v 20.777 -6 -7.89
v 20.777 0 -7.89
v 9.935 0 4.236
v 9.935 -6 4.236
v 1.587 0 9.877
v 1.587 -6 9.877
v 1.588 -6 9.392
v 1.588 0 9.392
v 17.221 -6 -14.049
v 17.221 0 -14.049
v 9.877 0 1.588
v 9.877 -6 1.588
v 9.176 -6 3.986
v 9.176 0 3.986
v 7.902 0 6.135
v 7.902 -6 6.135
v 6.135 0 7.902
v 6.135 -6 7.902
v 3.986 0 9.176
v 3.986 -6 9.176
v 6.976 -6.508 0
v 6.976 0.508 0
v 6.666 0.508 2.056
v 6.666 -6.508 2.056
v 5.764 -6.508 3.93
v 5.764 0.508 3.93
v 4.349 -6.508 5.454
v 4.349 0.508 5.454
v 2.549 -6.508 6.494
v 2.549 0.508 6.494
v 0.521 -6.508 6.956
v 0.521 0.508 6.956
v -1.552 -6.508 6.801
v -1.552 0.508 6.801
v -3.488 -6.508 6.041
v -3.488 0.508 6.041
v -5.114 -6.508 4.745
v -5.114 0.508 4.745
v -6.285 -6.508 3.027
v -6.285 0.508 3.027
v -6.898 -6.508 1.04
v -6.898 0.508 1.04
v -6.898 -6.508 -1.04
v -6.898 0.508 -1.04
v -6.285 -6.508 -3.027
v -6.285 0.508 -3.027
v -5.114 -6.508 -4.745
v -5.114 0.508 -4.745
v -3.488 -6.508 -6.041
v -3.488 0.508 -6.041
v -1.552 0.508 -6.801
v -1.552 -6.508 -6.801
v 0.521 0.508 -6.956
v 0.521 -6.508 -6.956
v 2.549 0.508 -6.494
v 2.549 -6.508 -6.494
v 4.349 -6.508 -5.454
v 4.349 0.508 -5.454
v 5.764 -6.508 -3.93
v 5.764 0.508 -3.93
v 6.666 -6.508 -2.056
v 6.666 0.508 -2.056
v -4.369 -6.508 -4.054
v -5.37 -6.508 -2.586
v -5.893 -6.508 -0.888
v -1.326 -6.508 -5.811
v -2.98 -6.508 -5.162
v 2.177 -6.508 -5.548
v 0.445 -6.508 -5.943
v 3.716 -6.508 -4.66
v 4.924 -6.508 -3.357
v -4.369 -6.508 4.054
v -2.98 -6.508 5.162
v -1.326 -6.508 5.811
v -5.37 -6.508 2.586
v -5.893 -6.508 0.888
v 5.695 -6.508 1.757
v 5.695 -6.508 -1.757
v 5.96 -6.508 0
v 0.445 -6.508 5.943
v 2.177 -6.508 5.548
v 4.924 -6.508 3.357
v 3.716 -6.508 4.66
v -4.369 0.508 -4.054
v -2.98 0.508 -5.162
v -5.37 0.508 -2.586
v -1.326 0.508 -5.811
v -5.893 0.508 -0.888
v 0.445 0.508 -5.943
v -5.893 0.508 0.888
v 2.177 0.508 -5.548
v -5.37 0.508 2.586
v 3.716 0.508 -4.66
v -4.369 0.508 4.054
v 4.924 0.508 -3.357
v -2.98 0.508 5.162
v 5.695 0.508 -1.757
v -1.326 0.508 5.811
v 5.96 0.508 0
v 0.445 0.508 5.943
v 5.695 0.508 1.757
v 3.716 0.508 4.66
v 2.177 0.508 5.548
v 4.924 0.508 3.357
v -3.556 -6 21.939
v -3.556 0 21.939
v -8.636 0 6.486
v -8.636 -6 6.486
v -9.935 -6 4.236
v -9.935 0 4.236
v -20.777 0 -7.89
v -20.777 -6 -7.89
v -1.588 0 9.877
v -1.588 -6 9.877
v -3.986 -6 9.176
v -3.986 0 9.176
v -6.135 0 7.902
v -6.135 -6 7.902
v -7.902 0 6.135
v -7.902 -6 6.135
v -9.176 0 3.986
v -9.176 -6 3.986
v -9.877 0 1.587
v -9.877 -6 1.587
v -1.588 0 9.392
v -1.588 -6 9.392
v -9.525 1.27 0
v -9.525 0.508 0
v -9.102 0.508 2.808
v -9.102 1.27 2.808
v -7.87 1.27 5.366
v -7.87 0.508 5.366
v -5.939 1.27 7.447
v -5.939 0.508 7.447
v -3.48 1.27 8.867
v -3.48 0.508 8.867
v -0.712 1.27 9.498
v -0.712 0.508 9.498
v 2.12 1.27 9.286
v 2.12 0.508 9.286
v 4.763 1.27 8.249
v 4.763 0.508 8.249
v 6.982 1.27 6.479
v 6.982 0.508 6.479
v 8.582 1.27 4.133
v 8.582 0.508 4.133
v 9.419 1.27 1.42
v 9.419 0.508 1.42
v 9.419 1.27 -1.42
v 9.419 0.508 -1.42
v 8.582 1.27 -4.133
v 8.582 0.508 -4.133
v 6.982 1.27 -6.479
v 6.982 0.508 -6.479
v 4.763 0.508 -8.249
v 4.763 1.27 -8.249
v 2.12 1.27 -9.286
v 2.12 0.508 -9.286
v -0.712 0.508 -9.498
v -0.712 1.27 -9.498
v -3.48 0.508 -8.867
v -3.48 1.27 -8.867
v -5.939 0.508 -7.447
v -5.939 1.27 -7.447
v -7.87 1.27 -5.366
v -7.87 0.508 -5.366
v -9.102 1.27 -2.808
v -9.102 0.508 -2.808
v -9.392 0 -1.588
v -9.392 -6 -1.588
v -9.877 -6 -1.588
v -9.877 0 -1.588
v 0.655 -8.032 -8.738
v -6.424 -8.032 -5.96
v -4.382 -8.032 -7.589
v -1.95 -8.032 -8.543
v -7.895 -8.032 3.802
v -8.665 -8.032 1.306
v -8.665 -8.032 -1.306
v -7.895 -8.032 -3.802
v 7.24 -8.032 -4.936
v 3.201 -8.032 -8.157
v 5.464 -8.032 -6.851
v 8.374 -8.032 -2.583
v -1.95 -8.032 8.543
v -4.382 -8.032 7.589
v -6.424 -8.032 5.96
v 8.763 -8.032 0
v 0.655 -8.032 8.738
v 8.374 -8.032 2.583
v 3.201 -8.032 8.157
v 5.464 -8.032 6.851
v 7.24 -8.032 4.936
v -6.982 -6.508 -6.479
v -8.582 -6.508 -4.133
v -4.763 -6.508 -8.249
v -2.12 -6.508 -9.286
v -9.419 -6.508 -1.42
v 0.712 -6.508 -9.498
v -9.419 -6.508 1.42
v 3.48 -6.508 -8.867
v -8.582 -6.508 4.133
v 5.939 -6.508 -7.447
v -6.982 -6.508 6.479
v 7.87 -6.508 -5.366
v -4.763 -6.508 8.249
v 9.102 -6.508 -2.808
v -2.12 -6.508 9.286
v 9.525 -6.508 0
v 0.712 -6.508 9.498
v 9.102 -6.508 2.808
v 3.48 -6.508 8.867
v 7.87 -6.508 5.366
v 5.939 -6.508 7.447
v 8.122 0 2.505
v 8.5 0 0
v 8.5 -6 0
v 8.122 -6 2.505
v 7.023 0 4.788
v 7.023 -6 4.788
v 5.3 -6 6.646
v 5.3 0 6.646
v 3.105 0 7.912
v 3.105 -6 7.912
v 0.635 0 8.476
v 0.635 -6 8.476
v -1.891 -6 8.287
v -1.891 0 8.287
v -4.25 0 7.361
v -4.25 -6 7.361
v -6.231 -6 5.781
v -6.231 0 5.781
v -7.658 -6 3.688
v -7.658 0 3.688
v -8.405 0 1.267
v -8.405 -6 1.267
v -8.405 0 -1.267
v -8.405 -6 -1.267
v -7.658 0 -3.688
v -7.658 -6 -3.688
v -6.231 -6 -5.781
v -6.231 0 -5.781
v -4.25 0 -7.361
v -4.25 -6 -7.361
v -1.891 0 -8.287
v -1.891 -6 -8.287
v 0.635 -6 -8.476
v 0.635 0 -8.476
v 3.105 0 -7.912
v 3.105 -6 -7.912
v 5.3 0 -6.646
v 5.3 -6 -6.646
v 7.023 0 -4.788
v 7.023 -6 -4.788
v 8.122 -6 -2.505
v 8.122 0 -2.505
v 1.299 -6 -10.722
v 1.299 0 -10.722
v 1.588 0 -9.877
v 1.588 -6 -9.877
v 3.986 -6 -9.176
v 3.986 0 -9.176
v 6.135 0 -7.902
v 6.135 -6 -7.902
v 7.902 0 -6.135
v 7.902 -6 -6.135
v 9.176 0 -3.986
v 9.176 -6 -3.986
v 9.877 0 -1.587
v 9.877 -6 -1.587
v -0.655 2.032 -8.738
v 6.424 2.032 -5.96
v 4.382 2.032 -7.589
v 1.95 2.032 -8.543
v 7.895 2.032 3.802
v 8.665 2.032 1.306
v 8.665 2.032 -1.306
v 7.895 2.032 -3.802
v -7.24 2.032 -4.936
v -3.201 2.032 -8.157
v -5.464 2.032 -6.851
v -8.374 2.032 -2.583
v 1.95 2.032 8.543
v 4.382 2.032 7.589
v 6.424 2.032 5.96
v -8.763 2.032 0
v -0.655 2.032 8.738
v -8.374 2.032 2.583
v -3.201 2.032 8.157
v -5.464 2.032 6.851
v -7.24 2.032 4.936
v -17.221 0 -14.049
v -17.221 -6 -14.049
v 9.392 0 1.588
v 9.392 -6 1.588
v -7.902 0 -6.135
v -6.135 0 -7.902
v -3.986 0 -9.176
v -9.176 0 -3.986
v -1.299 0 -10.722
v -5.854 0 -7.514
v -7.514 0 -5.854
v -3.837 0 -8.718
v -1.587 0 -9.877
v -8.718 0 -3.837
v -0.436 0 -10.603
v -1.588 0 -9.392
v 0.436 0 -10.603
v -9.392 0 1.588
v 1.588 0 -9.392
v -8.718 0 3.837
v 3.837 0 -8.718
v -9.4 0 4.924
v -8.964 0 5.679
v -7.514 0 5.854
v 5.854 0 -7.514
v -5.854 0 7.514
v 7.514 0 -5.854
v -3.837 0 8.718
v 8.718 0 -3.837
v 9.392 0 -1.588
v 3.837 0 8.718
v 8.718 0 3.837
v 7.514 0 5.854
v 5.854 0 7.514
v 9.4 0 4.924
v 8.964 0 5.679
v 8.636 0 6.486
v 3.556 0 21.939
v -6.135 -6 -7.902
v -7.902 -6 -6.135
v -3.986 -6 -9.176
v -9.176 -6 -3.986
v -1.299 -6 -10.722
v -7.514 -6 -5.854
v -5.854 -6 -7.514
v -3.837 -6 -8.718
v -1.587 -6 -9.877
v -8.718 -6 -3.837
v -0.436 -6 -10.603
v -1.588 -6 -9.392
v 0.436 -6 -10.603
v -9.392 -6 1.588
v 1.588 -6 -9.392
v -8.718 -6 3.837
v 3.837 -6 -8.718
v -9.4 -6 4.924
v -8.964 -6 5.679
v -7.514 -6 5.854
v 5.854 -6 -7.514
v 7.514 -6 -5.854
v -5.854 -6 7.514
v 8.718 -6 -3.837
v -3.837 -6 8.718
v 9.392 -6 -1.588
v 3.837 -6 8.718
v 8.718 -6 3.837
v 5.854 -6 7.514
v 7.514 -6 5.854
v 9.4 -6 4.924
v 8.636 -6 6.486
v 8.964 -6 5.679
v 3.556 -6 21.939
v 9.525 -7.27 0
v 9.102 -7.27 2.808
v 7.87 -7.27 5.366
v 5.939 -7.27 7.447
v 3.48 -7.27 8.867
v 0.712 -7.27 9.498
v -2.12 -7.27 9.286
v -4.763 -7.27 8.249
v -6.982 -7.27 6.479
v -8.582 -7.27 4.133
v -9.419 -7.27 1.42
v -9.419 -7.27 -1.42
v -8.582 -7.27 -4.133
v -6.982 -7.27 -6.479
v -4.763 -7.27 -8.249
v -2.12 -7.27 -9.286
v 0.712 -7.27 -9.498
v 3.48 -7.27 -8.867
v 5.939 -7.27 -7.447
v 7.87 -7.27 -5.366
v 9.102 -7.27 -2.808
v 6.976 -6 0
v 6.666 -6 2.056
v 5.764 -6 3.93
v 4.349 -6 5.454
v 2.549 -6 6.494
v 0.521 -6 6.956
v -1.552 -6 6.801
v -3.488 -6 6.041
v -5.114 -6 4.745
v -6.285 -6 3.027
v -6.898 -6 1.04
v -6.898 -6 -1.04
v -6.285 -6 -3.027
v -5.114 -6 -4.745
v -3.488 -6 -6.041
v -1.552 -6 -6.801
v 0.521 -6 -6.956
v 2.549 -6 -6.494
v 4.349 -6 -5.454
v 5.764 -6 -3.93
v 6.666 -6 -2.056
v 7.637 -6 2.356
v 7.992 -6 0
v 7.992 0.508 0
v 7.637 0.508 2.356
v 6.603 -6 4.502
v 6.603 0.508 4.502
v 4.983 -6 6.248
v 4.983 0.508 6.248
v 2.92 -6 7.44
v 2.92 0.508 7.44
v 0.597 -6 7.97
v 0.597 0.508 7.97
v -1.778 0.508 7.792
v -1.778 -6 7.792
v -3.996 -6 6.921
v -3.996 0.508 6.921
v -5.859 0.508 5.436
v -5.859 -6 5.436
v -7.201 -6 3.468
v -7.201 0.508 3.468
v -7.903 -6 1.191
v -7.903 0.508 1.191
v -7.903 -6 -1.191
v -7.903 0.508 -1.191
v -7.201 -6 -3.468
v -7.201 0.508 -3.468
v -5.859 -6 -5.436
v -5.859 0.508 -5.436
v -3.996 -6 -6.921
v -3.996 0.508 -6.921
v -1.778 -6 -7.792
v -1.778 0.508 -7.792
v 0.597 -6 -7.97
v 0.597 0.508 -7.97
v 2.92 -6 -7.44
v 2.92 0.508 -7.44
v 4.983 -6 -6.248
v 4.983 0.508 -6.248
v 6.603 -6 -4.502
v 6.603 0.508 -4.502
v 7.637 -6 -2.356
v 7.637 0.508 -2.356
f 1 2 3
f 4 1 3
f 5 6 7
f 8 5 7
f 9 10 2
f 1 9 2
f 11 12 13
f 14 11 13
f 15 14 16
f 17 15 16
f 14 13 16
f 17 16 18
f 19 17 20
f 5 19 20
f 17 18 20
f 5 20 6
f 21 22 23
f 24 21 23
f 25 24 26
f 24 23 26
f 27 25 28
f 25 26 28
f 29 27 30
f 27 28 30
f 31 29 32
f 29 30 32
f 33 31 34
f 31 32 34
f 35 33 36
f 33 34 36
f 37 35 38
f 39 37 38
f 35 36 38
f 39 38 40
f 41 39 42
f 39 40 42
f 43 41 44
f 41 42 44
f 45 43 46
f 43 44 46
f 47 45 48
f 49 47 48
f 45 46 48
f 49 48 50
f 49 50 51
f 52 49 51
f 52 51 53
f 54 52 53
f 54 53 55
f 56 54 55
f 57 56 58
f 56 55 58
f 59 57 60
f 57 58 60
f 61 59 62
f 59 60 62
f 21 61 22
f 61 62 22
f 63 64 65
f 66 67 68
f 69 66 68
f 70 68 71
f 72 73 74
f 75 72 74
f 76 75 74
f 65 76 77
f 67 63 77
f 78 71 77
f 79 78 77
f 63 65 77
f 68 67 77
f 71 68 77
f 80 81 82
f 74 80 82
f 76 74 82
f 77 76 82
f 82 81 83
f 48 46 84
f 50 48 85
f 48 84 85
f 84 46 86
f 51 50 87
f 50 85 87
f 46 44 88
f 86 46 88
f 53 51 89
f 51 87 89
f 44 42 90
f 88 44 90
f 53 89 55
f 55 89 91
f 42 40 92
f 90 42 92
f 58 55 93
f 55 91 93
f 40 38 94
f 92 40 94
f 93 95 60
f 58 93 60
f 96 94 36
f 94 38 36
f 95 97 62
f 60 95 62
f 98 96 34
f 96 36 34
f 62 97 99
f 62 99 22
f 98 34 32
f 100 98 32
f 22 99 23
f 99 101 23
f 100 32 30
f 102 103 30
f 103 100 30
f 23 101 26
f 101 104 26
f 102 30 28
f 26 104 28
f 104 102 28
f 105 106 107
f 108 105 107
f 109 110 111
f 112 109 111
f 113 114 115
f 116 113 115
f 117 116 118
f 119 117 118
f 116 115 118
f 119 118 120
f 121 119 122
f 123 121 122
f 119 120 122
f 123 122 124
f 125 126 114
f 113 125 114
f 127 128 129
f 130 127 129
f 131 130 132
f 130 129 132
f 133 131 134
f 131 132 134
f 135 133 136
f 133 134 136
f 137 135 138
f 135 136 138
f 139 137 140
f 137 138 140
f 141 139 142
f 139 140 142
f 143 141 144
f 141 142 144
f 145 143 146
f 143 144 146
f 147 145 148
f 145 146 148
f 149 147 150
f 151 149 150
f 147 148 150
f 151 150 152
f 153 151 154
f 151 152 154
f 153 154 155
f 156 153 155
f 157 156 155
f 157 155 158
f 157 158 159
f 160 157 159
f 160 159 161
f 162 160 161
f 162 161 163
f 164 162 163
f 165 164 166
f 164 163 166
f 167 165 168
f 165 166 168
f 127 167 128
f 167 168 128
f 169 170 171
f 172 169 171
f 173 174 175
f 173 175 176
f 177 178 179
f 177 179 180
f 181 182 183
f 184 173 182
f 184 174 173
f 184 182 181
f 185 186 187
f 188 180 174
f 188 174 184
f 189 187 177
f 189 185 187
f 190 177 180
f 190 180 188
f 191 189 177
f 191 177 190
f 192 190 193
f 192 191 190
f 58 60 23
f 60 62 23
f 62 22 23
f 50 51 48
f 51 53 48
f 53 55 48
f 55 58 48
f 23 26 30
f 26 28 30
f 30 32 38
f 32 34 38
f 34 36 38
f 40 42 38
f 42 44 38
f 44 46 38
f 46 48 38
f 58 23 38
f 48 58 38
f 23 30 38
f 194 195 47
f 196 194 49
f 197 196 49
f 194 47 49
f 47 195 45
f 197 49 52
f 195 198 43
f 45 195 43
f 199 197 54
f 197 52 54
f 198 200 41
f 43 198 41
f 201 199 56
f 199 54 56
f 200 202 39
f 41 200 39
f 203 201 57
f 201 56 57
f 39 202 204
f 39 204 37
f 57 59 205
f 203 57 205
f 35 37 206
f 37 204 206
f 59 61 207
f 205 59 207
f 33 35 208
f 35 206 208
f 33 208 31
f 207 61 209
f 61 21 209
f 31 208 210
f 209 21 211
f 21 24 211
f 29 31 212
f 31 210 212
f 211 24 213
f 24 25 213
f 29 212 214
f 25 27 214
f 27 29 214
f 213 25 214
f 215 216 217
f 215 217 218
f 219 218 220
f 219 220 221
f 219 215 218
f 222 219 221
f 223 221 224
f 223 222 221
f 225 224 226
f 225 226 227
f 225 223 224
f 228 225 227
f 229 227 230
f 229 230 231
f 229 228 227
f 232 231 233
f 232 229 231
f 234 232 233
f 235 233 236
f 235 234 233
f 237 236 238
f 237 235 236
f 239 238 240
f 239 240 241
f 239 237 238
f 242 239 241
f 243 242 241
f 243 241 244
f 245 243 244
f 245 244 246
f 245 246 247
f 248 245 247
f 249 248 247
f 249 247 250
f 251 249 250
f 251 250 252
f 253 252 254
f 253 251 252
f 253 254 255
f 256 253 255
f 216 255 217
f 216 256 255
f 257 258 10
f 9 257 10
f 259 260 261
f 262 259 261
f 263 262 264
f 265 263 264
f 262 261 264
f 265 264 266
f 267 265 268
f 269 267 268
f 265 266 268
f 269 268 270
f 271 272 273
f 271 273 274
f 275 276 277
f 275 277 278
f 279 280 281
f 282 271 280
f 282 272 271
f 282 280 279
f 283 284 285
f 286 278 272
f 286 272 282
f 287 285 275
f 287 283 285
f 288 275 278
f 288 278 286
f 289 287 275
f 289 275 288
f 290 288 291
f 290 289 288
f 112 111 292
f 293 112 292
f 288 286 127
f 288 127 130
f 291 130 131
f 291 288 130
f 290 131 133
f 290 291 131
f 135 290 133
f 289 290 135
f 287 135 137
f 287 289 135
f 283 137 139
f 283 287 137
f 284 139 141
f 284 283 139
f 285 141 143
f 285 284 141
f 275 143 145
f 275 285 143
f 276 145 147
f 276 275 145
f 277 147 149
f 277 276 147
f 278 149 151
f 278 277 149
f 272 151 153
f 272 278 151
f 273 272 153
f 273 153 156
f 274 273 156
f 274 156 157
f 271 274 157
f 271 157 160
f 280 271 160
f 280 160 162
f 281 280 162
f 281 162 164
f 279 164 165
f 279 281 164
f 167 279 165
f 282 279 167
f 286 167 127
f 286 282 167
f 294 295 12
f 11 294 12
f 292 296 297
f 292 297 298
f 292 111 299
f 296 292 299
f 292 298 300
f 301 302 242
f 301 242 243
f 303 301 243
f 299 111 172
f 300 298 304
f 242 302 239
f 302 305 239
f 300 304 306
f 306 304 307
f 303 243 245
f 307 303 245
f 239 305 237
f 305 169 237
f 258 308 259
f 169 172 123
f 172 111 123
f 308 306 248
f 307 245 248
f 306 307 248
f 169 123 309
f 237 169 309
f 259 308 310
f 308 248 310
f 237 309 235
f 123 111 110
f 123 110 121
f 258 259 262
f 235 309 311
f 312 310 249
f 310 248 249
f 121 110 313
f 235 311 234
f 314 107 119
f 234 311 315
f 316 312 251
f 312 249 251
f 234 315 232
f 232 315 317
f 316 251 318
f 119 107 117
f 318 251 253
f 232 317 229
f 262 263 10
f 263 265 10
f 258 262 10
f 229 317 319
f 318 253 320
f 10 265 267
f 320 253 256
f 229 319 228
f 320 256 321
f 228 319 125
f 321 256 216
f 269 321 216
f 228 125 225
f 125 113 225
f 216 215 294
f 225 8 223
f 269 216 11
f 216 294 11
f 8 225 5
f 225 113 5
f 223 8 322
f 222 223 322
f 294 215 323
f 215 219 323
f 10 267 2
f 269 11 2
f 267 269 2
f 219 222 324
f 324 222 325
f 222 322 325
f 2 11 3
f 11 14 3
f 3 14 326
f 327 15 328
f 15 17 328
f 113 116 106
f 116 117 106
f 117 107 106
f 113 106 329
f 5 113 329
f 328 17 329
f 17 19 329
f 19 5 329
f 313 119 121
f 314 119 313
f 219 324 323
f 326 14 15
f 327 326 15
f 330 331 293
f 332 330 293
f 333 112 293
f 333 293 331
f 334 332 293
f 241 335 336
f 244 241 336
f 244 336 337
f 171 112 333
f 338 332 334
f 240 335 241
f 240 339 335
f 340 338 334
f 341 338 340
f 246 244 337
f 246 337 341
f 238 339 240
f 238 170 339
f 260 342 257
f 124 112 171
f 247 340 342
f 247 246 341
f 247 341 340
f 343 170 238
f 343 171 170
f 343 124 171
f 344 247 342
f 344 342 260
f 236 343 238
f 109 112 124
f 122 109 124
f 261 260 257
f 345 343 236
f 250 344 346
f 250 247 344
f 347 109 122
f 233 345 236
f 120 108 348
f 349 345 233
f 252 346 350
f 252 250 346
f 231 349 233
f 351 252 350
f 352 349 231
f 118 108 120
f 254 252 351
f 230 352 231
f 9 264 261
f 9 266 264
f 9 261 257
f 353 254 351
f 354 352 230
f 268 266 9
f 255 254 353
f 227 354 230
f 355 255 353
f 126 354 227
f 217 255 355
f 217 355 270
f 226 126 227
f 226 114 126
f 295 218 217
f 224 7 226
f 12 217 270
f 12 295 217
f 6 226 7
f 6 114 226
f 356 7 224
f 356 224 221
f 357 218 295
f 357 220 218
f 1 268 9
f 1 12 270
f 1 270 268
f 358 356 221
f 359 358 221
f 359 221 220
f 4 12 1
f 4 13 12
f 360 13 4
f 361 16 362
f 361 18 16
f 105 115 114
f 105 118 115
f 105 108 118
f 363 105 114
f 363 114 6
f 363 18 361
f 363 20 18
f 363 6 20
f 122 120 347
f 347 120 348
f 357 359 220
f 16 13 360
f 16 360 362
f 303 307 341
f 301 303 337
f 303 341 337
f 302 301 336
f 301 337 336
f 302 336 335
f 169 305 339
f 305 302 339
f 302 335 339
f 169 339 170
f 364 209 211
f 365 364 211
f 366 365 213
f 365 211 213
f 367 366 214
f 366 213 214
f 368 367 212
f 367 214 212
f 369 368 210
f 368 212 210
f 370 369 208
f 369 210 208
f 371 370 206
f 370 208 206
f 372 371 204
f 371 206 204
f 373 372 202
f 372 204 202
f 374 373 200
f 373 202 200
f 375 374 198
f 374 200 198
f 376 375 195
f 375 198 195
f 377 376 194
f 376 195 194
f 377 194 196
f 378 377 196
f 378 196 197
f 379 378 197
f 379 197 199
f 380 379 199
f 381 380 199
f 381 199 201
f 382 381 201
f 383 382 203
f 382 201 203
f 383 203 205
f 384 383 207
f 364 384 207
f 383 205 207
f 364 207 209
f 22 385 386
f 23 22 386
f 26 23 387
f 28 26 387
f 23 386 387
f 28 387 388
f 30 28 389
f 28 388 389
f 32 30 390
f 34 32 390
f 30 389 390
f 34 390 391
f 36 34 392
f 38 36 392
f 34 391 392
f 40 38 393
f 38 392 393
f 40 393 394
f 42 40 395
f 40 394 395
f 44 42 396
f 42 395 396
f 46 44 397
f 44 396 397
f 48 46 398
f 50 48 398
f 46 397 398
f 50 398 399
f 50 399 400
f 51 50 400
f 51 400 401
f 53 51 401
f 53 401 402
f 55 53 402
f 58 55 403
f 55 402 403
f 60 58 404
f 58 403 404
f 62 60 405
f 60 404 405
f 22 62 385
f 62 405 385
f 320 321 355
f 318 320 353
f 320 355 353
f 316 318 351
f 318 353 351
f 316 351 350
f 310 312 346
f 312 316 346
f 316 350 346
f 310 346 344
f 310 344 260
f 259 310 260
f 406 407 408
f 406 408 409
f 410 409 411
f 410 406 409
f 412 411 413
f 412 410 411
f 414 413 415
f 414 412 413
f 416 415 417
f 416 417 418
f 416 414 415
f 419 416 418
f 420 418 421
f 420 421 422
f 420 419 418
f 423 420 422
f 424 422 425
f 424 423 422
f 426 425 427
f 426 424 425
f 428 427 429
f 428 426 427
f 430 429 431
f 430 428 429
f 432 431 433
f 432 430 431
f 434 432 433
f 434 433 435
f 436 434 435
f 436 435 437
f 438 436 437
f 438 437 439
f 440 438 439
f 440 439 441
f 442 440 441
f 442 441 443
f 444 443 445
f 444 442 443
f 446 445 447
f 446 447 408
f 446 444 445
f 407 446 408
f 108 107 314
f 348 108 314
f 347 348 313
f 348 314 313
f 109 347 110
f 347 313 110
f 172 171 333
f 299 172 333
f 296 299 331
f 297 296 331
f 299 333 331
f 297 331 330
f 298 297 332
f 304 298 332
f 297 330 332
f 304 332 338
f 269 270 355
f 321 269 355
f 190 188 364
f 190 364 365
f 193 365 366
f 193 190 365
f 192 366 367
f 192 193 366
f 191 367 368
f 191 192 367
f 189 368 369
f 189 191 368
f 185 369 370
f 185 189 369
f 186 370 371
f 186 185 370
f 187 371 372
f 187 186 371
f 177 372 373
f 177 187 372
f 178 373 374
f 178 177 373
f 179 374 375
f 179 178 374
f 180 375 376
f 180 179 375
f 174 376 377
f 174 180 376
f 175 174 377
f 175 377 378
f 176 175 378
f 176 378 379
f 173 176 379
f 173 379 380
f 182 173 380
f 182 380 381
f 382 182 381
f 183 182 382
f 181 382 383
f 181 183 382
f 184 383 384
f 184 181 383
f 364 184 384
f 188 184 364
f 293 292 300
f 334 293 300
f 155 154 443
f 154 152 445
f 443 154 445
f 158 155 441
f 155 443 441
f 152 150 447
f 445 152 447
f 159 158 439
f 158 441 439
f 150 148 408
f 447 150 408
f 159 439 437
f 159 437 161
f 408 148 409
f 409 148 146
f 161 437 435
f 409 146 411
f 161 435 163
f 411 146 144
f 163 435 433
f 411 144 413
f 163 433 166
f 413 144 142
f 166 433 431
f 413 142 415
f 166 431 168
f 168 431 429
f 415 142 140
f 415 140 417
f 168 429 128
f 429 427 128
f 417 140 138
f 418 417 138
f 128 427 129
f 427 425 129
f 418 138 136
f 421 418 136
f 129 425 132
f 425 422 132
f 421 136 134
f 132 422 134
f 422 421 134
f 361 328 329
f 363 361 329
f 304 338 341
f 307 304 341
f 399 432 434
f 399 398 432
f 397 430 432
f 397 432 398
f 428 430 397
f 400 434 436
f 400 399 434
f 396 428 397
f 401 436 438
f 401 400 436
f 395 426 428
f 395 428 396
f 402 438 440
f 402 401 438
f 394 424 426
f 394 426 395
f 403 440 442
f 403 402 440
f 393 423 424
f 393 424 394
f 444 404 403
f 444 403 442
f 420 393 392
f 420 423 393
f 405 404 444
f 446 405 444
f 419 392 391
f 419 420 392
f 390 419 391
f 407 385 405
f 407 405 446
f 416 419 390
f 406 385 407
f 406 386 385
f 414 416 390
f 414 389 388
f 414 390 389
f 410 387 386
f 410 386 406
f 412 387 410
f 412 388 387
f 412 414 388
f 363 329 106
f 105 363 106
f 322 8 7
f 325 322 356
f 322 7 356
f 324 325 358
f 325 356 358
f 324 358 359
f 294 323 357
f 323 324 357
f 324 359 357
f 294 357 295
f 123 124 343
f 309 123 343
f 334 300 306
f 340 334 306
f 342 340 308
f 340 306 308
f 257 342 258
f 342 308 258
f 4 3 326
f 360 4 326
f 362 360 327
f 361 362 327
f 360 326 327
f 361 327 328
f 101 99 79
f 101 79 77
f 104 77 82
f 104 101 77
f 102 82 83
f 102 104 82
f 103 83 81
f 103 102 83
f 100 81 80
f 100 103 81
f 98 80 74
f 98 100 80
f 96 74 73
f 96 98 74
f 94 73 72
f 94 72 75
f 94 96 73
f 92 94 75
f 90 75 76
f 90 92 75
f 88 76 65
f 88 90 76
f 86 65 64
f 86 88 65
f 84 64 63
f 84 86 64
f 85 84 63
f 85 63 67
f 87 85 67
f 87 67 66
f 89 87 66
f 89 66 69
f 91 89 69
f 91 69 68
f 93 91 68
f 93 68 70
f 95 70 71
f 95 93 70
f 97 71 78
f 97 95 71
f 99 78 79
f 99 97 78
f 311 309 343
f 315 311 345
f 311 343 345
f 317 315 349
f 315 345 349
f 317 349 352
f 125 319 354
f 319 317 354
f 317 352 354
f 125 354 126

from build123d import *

# Parameters (mm, degrees)
F0_R       = 8.5
F1_DEPTH   = 6
F2_R       = 7.992
F2_R_2     = 6.976
F3_DEPTH   = 6.508
F4_R       = 9.525
F4_R_2     = 7.992
F4_R_3     = 6.976
F5_DEPTH   = 1.524
F6_R       = 6.976
F6_R_2     = 5.96
F7_DEPTH   = 7.016
F8_R       = 9.525
F8_R_2     = 6.976
F8_R_3     = 5.96
F9_DEPTH   = 1.524
F10_SIZE   = 0.762
F10_2_SIZE = 0.762
F12_DEPTH  = 8.033
F14_DEPTH  = 8.033


with BuildPart() as f1:
    # F0 (on Front) → F1 (new body)
    with BuildSketch(Plane.XZ):
        with BuildLine():
            Line((3.556, 21.9386756437), (-3.556, 21.9386756437))
            Line((-3.556, 21.9386756437), (-8.636, 6.4857160009))
            ThreePointArc((-8.636, 6.4857160009), (-9.1691393476, 5.2938050706), (-9.9347948185, 4.2361373866))
            Line((-9.9347948185, 4.2361373866), (-20.7774504328, -7.889751486))
            Line((-20.7774504328, -7.889751486), (-17.2214504328, -14.0489241577))
            Line((-17.2214504328, -14.0489241577), (-1.2987948185, -10.7218533875))
            ThreePointArc((-1.2987948185, -10.7218533875), (0, -10.5876101411), (1.2987948185, -10.7218533875))
            Line((1.2987948185, -10.7218533875), (17.2214504328, -14.0489241577))
            Line((17.2214504328, -14.0489241577), (20.7774504328, -7.889751486))
            Line((20.7774504328, -7.889751486), (9.9347948185, 4.2361373866))
            ThreePointArc((9.9347948185, 4.2361373866), (9.1691393476, 5.2938050706), (8.636, 6.4857160009))
            Line((8.636, 6.4857160009), (3.556, 21.9386756437))
        make_face()
        Circle(F0_R, mode=Mode.SUBTRACT)
    extrude(amount=F1_DEPTH)

    # F11 (on face) → F12 (cut, through all)
    with BuildSketch(Plane.XZ.offset(6)):
        Polygon((0, 29.2248509662), (5.4864, 32.3924254831), (5.4864, 38.7275745169), (0, 41.8951490338), (-5.4864, 38.7275745169), (-5.4864, 32.3924254831), align=None)
    extrude(amount=-F12_DEPTH, mode=Mode.SUBTRACT)

    # F13 (on face) → F14 (cut, through all)
    with BuildSketch(Plane.XZ.offset(6)):
        with BuildLine():
            Line((-1.5875, 9.3917766557), (-1.5875, 9.8772922774))
            ThreePointArc((-1.5875, 9.8772922774), (-7.0739330992, 7.0739330992), (-9.8772922774, 1.5875))
            Line((-9.8772922774, 1.5875), (-9.3917766557, 1.5875))
            ThreePointArc((-9.3917766557, 1.5875), (-6.7351920908, 6.7351920908), (-1.5875, 9.3917766557))
        make_face()
        with BuildLine():
            Line((9.3917766557, 1.5875), (9.8772922774, 1.5875))
            ThreePointArc((9.8772922774, 1.5875), (7.0739330992, 7.0739330992), (1.5875, 9.8772922774))
            Line((1.5875, 9.8772922774), (1.5875, 9.3917766557))
            ThreePointArc((1.5875, 9.3917766557), (6.7351920908, 6.7351920908), (9.3917766557, 1.5875))
        make_face()
        with BuildLine():
            Line((-9.3917766557, -1.5875), (-9.8772922774, -1.5875))
            ThreePointArc((-9.8772922774, -1.5875), (-7.0739330992, -7.0739330992), (-1.5875, -9.8772922774))
            Line((-1.5875, -9.8772922774), (-1.5875, -9.3917766557))
            ThreePointArc((-1.5875, -9.3917766557), (-6.7351920908, -6.7351920908), (-9.3917766557, -1.5875))
        make_face()
        with BuildLine():
            Line((1.5875, -9.3917766557), (1.5875, -9.8772922774))
            ThreePointArc((1.5875, -9.8772922774), (7.0739330992, -7.0739330992), (9.8772922774, -1.5875))
            Line((9.8772922774, -1.5875), (9.3917766557, -1.5875))
            ThreePointArc((9.3917766557, -1.5875), (6.7351920908, -6.7351920908), (1.5875, -9.3917766557))
        make_face()
    extrude(amount=-F14_DEPTH, mode=Mode.SUBTRACT)


with BuildPart() as f3:
    # F2 (on face) → F3 (new body, through all)
    with BuildSketch(Plane.XZ.offset(6)):
        Circle(F2_R)
        Circle(F2_R_2, mode=Mode.SUBTRACT)
    extrude(amount=-F3_DEPTH)

    # F4 (on face) → F5 (join)
    with BuildSketch(Plane(origin=(0, 0.508, 0), x_dir=(-1, 0, 0), z_dir=(0, 1, 0))):
        Circle(F4_R)
        Circle(F4_R_2, mode=Mode.SUBTRACT)
        Circle(F4_R_2)
        Circle(F4_R_3, mode=Mode.SUBTRACT)
        Circle(F4_R_3)
    extrude(amount=F5_DEPTH)

    # F10
    f10_edges = [f3.edges().sort_by_distance(p)[0] for p in [
        (9.525, 2.032, 0),
    ]]
    chamfer(f10_edges, length=F10_SIZE)


with BuildPart() as f7:
    # F6 (on face) → F7 (new body, through all)
    with BuildSketch(Plane.XZ.offset(-0.508)):
        Circle(F6_R)
        Circle(F6_R_2, mode=Mode.SUBTRACT)
    extrude(amount=F7_DEPTH)

    # F8 (on face) → F9 (join)
    with BuildSketch(Plane.XZ.offset(6.508)):
        Circle(F8_R)
        Circle(F8_R_2, mode=Mode.SUBTRACT)
        Circle(F8_R_2)
        Circle(F8_R_3, mode=Mode.SUBTRACT)
        Circle(F8_R_3)
    extrude(amount=F9_DEPTH)

    # F10#2
    f10_2_edges = [f7.edges().sort_by_distance(p)[0] for p in [
        (-9.525, -8.032, 0),
    ]]
    chamfer(f10_2_edges, length=F10_2_SIZE)


solid = Compound([f1.part, f3.part, f7.part])
